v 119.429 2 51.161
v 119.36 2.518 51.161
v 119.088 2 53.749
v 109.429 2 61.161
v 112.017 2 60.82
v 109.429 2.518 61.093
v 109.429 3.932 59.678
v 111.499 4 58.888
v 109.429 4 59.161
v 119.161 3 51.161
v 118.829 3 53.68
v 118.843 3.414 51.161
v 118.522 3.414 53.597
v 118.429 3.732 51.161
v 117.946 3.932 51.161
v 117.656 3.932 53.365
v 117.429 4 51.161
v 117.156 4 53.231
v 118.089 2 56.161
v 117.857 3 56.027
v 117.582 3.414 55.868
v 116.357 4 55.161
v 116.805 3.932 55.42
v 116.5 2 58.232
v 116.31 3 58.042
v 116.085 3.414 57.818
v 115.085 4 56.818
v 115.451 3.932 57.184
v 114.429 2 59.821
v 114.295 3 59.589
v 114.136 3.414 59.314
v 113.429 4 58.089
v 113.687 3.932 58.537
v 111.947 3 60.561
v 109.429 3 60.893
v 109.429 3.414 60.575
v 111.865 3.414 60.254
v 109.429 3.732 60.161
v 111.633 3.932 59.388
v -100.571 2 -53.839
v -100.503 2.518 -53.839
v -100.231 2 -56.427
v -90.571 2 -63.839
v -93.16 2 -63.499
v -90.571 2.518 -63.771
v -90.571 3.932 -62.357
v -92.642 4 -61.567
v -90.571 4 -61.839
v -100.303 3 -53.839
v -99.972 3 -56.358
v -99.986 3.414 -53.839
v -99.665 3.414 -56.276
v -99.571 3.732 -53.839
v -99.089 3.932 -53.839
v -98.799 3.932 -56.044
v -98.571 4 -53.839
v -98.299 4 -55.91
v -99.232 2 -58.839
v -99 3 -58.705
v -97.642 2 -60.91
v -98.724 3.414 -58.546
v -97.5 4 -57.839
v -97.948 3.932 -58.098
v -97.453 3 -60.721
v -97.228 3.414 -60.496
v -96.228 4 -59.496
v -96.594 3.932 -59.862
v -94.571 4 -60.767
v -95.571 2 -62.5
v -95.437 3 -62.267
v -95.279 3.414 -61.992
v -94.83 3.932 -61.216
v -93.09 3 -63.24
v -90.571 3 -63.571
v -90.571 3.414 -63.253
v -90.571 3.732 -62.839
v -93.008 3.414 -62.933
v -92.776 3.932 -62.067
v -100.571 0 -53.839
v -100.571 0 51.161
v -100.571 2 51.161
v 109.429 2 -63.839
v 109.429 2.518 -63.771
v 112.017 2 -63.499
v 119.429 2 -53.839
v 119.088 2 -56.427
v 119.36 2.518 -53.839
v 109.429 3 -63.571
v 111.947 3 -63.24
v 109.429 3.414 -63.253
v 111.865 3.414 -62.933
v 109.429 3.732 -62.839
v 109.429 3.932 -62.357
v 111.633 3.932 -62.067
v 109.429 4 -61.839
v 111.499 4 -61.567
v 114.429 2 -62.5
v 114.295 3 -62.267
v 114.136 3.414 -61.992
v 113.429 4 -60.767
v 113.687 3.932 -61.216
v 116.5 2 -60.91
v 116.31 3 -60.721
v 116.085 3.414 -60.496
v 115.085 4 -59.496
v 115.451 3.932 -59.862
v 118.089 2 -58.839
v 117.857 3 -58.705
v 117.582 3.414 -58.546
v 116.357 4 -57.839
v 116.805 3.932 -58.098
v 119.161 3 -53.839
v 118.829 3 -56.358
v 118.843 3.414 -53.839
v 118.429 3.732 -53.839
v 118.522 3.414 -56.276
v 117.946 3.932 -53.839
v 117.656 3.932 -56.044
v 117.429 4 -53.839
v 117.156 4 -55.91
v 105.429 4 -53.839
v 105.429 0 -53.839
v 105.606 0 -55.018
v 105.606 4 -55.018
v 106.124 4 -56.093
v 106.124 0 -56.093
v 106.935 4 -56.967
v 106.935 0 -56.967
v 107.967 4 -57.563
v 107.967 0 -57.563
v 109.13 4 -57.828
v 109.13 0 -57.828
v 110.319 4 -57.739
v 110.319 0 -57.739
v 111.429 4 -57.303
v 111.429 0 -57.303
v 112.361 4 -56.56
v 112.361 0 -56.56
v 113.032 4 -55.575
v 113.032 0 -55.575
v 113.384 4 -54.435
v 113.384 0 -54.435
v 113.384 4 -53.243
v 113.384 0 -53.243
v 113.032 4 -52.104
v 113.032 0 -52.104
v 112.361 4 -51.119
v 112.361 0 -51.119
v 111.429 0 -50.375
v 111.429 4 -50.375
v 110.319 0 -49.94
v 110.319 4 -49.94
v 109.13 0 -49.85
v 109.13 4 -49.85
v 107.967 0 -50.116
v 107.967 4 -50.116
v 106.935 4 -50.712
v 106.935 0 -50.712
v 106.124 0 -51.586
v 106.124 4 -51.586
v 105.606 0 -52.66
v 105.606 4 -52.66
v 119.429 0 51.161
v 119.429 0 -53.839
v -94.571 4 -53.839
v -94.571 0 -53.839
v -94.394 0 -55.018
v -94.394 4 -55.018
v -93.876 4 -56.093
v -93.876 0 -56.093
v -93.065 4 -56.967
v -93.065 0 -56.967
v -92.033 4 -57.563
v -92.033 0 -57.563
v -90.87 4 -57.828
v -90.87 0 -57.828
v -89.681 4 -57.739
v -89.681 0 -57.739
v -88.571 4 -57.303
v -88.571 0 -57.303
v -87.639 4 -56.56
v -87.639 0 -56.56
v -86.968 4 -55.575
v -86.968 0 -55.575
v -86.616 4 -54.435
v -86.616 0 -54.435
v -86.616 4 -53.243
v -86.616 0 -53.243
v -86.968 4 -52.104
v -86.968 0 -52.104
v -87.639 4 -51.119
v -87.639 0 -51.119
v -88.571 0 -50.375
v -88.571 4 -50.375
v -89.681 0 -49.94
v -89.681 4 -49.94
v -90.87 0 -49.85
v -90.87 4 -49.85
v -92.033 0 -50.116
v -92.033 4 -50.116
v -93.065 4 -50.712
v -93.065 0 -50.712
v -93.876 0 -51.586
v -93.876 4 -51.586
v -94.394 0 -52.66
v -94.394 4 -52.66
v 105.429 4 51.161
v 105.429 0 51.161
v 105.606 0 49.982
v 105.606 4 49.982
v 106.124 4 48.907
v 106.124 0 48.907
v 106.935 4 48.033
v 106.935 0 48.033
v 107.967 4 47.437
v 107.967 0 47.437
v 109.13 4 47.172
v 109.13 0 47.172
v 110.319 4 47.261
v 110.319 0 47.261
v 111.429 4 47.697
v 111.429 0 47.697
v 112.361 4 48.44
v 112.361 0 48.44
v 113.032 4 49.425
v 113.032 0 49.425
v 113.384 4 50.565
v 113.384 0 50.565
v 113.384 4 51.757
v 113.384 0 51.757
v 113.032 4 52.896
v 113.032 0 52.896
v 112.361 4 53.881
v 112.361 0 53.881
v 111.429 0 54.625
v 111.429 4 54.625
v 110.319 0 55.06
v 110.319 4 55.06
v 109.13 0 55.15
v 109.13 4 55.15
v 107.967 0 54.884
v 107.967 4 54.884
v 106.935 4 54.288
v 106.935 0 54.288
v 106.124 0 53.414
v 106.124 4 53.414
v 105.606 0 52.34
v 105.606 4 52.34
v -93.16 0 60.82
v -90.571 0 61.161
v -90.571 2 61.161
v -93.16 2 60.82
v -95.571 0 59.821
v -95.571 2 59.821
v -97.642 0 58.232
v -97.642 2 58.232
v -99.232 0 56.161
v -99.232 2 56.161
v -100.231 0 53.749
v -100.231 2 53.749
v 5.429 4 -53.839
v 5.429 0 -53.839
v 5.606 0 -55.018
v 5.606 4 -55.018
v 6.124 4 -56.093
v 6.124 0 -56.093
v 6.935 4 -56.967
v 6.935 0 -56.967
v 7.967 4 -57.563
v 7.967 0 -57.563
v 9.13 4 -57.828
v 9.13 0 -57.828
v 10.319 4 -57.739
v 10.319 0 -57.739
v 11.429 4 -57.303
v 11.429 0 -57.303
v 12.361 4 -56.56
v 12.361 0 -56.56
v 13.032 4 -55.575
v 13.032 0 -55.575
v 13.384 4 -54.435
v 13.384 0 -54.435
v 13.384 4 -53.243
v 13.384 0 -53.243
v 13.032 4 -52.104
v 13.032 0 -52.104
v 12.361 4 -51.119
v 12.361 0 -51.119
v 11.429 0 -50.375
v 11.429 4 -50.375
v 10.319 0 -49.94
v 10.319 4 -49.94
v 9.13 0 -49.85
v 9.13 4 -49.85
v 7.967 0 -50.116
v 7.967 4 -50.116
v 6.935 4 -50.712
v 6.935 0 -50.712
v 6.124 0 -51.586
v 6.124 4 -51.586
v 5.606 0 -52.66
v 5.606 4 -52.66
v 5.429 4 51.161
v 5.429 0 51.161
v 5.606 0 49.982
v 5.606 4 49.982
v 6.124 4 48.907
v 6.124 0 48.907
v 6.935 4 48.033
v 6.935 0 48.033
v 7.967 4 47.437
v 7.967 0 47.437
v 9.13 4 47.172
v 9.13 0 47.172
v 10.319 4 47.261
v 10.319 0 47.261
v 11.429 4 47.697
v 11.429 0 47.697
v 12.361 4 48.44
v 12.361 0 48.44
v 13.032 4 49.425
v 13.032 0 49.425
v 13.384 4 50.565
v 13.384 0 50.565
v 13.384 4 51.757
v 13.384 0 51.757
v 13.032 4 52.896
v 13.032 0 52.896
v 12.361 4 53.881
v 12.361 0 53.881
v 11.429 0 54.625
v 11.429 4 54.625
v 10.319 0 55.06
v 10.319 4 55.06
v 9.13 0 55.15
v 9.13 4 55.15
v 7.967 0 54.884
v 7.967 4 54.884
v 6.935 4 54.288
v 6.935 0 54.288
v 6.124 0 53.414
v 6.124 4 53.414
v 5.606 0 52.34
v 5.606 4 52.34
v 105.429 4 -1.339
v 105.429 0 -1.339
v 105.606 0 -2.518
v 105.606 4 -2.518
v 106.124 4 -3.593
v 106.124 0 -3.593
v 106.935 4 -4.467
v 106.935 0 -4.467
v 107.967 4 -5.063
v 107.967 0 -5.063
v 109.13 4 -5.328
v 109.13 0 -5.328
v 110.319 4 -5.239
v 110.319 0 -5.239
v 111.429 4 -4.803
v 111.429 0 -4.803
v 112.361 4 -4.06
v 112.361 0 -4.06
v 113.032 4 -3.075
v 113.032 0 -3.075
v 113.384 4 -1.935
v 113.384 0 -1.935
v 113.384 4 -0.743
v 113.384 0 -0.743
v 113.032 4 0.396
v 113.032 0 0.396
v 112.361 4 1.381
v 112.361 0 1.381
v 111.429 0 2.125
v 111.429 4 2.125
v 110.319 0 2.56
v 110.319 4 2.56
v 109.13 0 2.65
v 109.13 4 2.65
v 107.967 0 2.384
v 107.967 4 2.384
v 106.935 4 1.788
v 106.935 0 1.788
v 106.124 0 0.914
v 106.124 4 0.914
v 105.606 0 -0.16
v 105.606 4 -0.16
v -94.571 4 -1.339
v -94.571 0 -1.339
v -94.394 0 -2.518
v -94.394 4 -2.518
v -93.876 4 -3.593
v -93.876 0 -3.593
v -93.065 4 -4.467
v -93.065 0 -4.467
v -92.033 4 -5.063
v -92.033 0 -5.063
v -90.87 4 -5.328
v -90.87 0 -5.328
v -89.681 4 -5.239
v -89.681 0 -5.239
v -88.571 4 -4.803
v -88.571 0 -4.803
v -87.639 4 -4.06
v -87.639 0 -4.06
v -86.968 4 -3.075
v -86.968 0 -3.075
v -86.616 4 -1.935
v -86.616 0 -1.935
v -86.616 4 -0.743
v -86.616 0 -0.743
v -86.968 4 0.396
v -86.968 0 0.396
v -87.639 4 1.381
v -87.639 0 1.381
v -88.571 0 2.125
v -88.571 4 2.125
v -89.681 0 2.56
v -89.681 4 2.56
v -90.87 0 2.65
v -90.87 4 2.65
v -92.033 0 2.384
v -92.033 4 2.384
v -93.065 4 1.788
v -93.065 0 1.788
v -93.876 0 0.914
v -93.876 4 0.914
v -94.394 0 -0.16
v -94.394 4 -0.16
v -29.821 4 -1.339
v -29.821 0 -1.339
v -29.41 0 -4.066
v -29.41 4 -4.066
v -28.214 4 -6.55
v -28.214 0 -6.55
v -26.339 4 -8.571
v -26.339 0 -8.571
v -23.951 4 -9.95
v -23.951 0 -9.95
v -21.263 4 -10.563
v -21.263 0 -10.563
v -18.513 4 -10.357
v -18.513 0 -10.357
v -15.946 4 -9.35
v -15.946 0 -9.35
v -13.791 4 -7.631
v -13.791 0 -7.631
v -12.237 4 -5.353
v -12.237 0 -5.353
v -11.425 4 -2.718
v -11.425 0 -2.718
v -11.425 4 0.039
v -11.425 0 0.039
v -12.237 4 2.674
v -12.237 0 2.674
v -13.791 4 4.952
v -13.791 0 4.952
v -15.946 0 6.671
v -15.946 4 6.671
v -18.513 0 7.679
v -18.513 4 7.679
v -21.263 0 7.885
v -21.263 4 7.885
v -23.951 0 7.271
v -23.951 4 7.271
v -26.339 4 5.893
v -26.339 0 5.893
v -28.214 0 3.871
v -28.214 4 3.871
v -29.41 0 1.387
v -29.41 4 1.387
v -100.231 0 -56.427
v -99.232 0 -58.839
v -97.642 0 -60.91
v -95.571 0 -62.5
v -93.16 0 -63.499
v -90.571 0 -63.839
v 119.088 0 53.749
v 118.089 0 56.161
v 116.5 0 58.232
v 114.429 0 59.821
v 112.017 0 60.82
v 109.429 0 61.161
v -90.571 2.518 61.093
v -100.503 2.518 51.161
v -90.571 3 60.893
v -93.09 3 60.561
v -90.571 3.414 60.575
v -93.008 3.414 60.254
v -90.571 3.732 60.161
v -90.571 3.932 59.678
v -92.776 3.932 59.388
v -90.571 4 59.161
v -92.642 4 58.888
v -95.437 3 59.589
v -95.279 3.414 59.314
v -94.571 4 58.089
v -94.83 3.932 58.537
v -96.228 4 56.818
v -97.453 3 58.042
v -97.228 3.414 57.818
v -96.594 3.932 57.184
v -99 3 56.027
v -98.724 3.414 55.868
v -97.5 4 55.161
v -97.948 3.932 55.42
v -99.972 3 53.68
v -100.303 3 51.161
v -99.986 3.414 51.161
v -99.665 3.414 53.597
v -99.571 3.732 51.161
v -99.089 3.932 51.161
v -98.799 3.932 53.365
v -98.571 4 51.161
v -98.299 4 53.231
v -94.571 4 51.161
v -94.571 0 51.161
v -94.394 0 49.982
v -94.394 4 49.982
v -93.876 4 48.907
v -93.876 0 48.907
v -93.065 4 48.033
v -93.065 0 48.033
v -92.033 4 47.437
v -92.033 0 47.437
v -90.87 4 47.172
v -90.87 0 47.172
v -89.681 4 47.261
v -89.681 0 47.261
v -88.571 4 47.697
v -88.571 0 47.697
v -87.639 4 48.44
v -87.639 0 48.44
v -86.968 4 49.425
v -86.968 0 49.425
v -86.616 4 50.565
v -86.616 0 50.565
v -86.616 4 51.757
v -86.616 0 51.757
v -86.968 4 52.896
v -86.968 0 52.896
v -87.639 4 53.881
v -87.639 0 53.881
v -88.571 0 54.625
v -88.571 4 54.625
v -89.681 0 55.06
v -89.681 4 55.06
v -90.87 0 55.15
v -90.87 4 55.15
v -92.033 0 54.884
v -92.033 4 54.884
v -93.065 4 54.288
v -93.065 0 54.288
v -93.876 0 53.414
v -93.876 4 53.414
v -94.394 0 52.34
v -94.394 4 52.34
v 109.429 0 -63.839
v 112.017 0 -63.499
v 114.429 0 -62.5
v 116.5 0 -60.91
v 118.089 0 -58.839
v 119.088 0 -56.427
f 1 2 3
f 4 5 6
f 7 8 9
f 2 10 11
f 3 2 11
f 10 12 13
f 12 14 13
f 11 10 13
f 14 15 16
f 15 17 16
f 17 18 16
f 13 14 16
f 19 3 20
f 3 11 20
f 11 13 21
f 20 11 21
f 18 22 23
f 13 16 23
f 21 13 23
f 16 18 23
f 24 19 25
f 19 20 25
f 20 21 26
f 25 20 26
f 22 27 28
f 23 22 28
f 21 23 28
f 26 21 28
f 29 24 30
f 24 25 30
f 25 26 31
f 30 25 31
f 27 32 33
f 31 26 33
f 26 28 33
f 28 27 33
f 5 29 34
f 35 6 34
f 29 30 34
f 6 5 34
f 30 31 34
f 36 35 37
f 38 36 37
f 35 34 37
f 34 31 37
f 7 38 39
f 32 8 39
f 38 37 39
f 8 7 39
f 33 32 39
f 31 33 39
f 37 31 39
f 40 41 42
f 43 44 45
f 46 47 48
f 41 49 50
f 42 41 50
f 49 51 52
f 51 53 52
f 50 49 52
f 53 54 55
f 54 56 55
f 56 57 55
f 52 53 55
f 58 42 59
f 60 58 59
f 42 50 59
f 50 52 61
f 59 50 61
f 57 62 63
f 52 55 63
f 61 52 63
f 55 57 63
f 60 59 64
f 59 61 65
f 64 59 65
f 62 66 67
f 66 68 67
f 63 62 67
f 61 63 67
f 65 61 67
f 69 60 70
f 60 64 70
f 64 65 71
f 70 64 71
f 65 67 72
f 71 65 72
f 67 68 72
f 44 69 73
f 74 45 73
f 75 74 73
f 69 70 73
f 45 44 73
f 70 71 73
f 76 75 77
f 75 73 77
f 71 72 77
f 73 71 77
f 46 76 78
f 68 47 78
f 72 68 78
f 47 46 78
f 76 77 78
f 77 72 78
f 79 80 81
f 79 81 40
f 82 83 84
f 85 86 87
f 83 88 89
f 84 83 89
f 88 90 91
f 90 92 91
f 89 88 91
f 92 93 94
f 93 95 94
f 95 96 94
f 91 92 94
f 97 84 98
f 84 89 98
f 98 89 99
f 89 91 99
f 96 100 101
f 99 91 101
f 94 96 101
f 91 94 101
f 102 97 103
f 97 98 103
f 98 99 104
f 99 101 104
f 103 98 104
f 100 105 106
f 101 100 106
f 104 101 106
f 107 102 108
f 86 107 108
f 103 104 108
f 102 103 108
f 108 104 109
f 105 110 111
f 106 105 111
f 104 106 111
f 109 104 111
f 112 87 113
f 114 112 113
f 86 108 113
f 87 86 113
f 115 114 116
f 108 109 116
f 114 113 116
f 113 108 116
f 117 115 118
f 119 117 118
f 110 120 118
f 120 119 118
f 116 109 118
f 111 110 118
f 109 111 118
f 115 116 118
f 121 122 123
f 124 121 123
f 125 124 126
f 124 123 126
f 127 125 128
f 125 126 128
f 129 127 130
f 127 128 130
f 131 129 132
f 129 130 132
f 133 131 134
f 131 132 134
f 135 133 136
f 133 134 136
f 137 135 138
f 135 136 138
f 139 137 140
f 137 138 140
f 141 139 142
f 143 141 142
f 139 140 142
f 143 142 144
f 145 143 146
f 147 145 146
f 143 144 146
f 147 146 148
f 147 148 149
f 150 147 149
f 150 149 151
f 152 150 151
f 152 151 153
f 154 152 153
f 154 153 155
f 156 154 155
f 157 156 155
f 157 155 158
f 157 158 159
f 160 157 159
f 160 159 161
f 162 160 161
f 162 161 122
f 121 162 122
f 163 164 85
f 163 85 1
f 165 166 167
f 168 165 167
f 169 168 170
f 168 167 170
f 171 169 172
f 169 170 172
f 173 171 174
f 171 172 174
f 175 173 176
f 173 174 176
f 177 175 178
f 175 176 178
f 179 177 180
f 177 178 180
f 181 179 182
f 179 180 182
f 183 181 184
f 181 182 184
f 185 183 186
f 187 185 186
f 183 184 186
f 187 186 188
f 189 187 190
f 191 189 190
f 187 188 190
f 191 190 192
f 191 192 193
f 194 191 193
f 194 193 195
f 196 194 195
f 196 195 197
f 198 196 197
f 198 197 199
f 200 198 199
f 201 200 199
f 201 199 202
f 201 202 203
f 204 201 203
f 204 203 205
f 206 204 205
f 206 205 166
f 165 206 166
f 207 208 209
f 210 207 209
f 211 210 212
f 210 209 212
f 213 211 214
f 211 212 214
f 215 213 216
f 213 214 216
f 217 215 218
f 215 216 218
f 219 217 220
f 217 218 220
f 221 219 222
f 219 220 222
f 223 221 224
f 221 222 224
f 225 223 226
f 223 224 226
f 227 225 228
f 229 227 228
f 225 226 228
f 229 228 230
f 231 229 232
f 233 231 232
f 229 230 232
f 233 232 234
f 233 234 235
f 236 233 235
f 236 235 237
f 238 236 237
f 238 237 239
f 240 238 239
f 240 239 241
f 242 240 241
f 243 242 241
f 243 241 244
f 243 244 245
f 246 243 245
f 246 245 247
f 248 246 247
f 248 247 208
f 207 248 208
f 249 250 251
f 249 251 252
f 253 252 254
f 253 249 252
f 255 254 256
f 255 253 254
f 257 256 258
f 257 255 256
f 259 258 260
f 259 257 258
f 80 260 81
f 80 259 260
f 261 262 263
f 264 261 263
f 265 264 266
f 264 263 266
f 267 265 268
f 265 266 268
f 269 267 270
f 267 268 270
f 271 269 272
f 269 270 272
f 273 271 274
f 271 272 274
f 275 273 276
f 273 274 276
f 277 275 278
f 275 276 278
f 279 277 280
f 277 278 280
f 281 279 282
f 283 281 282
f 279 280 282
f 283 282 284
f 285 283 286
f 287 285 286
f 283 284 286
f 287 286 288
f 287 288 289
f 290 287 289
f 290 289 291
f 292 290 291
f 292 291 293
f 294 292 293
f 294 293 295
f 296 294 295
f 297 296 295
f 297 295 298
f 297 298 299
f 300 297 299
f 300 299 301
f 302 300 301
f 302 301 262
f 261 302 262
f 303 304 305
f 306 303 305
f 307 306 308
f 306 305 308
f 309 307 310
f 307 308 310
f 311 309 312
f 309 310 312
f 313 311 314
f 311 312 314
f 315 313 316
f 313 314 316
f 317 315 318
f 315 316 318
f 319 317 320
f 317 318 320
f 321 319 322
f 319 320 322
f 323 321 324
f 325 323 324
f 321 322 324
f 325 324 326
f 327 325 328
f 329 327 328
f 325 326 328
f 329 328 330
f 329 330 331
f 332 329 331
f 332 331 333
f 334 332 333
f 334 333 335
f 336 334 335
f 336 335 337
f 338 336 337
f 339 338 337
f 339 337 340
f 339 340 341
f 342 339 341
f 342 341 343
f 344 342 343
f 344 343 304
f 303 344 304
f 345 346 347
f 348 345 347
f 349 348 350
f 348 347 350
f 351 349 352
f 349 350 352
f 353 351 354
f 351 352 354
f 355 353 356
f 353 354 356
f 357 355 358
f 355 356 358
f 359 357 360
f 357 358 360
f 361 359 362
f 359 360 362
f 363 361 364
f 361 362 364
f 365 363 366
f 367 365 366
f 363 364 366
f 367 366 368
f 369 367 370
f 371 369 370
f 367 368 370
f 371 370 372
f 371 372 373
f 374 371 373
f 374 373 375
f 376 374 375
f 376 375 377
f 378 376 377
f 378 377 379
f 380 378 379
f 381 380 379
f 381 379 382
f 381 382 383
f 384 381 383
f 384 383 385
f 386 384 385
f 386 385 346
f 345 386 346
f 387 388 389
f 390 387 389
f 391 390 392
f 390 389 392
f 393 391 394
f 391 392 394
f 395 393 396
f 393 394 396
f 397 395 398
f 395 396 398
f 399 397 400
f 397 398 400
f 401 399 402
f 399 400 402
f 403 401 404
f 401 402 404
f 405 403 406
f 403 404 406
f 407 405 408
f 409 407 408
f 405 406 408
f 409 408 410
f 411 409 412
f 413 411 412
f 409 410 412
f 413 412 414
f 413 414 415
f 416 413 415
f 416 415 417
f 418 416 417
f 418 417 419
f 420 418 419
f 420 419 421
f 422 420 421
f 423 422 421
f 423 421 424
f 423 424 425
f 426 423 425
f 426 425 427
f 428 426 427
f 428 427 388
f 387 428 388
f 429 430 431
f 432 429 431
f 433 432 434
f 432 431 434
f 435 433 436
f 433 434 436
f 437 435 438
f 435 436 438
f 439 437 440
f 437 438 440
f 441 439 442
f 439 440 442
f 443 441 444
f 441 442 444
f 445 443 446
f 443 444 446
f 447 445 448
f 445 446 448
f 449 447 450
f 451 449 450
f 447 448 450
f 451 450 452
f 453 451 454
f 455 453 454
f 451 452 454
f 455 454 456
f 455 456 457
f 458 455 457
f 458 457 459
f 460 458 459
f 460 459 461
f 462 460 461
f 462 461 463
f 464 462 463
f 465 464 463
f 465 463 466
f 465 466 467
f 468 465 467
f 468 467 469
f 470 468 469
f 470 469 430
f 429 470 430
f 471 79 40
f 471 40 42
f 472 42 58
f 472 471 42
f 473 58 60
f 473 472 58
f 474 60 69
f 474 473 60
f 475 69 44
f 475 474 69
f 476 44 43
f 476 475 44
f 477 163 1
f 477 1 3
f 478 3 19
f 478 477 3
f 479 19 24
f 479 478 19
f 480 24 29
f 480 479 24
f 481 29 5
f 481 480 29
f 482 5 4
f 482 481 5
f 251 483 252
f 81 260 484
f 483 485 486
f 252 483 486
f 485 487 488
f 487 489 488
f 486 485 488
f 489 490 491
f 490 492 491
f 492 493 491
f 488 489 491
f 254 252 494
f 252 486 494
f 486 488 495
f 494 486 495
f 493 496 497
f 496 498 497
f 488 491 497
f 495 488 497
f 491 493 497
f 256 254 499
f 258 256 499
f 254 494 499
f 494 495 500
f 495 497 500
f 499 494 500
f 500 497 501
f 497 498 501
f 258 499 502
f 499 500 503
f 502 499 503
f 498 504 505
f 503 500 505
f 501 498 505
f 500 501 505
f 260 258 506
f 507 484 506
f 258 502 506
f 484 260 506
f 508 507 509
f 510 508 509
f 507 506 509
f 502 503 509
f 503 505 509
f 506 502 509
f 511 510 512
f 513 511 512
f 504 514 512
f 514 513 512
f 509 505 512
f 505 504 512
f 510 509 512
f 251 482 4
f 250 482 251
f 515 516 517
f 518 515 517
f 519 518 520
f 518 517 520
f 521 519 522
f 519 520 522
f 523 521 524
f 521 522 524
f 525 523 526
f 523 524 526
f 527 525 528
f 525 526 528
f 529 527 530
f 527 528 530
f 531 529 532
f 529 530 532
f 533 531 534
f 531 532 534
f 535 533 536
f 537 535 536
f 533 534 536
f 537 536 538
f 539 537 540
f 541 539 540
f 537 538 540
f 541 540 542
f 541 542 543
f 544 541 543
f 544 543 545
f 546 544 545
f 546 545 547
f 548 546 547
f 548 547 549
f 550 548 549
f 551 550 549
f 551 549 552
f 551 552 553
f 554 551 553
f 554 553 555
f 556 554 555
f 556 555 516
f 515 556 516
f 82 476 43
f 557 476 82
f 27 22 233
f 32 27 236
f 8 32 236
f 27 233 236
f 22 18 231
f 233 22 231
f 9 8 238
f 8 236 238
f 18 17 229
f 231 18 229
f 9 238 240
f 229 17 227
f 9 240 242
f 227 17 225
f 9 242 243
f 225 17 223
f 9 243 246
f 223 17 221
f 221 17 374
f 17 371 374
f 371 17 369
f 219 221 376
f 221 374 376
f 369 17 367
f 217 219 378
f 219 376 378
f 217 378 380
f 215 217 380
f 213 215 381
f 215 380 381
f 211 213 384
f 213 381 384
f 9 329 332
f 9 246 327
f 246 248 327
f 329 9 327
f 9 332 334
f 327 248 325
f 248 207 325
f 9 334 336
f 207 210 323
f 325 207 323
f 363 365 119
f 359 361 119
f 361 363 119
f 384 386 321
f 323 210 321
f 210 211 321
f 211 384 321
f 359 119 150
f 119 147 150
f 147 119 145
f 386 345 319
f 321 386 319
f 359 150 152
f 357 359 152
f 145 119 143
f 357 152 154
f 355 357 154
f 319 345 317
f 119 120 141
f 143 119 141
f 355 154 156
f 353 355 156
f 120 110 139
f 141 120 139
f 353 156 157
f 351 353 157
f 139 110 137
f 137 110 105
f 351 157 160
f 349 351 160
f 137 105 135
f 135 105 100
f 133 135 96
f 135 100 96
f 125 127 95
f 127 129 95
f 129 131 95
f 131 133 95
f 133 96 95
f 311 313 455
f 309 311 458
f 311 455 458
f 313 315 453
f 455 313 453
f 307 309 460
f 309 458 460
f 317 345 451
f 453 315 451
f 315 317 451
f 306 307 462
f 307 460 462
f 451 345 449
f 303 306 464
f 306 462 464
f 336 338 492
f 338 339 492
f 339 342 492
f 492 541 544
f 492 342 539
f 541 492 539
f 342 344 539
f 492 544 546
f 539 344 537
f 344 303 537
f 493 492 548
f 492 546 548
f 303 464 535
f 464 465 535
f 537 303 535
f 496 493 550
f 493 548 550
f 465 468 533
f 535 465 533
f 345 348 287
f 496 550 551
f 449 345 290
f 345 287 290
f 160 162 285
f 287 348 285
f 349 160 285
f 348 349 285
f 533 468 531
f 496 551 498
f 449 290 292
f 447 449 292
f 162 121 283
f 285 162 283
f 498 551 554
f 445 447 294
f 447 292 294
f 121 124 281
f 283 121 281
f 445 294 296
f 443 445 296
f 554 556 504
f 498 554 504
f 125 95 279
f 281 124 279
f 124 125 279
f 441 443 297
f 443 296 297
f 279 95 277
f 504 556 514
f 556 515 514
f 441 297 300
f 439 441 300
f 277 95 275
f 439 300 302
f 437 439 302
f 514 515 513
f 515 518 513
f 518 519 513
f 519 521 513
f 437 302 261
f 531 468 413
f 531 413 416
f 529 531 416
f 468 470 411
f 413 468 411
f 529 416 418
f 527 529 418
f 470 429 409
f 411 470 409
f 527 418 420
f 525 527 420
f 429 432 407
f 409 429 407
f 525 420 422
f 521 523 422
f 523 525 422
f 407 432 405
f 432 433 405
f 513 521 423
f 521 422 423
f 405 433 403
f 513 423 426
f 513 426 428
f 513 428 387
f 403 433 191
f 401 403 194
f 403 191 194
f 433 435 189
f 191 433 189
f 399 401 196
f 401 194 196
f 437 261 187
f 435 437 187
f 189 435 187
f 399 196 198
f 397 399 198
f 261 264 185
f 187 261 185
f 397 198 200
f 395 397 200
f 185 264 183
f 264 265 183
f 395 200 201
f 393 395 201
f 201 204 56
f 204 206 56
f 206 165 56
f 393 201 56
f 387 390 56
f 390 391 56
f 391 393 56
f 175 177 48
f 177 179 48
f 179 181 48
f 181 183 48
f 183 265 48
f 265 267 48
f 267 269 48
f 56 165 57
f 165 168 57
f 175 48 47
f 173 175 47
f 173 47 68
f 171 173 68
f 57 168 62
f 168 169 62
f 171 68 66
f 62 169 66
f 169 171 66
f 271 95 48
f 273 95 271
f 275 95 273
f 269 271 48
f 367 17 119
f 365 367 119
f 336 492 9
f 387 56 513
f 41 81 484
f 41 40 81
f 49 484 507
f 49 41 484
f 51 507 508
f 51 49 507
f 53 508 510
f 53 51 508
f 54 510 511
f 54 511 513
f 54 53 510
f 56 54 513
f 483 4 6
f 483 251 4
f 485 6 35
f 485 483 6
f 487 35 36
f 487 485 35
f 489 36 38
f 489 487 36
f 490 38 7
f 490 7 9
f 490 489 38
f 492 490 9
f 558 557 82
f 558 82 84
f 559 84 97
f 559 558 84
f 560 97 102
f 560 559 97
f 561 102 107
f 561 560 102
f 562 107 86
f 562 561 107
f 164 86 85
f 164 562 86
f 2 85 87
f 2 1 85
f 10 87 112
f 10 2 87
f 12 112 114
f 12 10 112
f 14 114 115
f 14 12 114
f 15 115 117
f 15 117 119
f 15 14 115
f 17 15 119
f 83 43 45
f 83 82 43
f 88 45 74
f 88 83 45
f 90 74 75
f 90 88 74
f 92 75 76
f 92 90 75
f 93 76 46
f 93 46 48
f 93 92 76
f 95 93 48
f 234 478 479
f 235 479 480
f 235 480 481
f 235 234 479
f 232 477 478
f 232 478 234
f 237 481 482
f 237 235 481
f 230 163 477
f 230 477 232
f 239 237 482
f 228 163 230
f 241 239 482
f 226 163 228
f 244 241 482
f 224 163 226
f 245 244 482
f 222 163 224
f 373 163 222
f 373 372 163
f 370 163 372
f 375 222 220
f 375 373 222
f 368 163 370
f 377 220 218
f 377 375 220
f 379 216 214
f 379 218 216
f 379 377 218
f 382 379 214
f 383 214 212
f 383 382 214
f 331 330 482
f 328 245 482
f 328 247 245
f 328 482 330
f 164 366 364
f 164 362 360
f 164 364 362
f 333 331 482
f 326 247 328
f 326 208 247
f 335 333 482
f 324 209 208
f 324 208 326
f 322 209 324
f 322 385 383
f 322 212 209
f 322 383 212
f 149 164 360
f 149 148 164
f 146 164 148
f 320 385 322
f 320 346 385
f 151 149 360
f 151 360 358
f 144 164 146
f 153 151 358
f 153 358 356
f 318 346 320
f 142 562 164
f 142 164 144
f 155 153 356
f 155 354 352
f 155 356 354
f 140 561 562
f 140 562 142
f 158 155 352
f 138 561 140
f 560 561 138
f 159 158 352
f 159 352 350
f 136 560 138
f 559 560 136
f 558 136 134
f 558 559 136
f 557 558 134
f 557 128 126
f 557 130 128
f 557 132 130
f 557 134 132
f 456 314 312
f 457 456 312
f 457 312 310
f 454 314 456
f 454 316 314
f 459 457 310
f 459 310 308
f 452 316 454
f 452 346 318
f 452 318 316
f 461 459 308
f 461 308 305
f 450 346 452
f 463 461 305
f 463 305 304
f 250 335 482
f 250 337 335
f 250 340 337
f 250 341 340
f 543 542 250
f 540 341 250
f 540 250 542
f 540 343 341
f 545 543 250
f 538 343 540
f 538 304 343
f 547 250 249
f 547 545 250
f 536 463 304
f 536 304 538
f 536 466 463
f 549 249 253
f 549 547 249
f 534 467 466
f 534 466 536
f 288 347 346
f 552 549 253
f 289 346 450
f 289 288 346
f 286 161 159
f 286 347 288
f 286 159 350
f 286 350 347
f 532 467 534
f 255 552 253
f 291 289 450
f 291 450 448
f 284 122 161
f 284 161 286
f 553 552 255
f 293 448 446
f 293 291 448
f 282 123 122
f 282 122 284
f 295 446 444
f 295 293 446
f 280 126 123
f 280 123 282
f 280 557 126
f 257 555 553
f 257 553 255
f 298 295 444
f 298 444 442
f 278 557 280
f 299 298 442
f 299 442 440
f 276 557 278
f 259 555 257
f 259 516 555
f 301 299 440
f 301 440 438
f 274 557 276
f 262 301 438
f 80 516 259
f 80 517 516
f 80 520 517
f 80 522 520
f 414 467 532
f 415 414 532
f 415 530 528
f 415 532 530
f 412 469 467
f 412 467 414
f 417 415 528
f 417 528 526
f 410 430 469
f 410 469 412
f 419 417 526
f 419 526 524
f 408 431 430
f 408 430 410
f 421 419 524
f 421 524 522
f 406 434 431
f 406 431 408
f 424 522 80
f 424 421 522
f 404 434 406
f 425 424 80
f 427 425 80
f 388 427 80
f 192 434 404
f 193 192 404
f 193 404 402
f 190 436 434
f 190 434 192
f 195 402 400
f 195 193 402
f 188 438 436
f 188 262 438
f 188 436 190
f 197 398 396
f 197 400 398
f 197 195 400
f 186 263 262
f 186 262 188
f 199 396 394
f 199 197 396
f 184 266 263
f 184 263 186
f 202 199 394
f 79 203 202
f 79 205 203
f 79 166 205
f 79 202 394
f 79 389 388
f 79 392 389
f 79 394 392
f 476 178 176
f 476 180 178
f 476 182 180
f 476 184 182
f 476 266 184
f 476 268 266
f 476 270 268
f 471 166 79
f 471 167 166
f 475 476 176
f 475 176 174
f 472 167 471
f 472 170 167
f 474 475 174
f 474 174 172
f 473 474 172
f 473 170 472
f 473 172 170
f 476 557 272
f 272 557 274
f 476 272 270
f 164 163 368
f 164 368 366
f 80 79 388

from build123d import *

# Parameters (mm, degrees)
BOSS_EXTRUDE1_DEPTH    = 4
FILLET1_R              = 2
F_8_0MM_DOWEL_HOLE1_D  = 8
M20X1_5_TAPPED_HOLE1_D = 18.5


with BuildPart() as part:
    # Sketch1 → Boss-Extrude1 (new body)
    with BuildSketch(Plane(origin=(0, 0, 0), x_dir=(1, 0, 0), z_dir=(0, 1, 0))):
        with BuildLine():
            Line((-90.571428571, 63.839285714), (109.428571429, 63.839285714))
            ThreePointArc((109.428571429, 63.839285714), (116.49963924, 60.910353526), (119.428571429, 53.839285714))
            Line((119.428571429, 53.839285714), (119.428571429, -51.160714286))
            ThreePointArc((119.428571429, -51.160714286), (116.49963924, -58.231782098), (109.428571429, -61.160714286))
            Line((109.428571429, -61.160714286), (-90.571428571, -61.160714286))
            ThreePointArc((-90.571428571, -61.160714286), (-97.642496383, -58.231782098), (-100.571428571, -51.160714286))
            Line((-100.571428571, -51.160714286), (-100.571428571, 53.839285714))
            ThreePointArc((-100.571428571, 53.839285714), (-97.642496383, 60.910353526), (-90.571428571, 63.839285714))
        make_face()
    extrude(amount=BOSS_EXTRUDE1_DEPTH)

    # Fillet1
    fillet1_edges = [part.edges().sort_by_distance(p)[0] for p in [
        (-97.642496383, 4, -60.910353526),
        (-100.571428571, 4, -1.339285714),
        (-97.642496383, 4, 58.231782098),
        (9.428571429, 4, 61.160714286),
        (116.49963924, 4, 58.231782098),
        (119.428571429, 4, -1.339285714),
        (116.49963924, 4, -60.910353526),
        (9.428571429, 4, -63.839285714),
    ]]
    fillet(fillet1_edges, radius=FILLET1_R)

    # Ø8.0mm Dowel Hole1 (through all)
    with Locations(Plane(origin=(0, 4, 0), x_dir=(1, 0, 0), z_dir=(0, 1, 0))):
        with Locations((-90.571428571, 53.839285714), (109.428571429, 53.839285714), (-90.571428571, -51.160714286), (109.428571429, -51.160714286), (109.428571429, 1.339285714), (9.428571429, 53.839285714), (-90.571428571, 1.339285714), (9.428571429, -51.160714286)):
            Hole(F_8_0MM_DOWEL_HOLE1_D / 2)

    # M20x1.5 Tapped Hole1 (through all)
    with Locations(Plane(origin=(0, 4, 0), x_dir=(1, 0, 0), z_dir=(0, 1, 0))):
        with Locations((-20.571428571, 1.339285714)):
            Hole(M20X1_5_TAPPED_HOLE1_D / 2)


solid = part.part
